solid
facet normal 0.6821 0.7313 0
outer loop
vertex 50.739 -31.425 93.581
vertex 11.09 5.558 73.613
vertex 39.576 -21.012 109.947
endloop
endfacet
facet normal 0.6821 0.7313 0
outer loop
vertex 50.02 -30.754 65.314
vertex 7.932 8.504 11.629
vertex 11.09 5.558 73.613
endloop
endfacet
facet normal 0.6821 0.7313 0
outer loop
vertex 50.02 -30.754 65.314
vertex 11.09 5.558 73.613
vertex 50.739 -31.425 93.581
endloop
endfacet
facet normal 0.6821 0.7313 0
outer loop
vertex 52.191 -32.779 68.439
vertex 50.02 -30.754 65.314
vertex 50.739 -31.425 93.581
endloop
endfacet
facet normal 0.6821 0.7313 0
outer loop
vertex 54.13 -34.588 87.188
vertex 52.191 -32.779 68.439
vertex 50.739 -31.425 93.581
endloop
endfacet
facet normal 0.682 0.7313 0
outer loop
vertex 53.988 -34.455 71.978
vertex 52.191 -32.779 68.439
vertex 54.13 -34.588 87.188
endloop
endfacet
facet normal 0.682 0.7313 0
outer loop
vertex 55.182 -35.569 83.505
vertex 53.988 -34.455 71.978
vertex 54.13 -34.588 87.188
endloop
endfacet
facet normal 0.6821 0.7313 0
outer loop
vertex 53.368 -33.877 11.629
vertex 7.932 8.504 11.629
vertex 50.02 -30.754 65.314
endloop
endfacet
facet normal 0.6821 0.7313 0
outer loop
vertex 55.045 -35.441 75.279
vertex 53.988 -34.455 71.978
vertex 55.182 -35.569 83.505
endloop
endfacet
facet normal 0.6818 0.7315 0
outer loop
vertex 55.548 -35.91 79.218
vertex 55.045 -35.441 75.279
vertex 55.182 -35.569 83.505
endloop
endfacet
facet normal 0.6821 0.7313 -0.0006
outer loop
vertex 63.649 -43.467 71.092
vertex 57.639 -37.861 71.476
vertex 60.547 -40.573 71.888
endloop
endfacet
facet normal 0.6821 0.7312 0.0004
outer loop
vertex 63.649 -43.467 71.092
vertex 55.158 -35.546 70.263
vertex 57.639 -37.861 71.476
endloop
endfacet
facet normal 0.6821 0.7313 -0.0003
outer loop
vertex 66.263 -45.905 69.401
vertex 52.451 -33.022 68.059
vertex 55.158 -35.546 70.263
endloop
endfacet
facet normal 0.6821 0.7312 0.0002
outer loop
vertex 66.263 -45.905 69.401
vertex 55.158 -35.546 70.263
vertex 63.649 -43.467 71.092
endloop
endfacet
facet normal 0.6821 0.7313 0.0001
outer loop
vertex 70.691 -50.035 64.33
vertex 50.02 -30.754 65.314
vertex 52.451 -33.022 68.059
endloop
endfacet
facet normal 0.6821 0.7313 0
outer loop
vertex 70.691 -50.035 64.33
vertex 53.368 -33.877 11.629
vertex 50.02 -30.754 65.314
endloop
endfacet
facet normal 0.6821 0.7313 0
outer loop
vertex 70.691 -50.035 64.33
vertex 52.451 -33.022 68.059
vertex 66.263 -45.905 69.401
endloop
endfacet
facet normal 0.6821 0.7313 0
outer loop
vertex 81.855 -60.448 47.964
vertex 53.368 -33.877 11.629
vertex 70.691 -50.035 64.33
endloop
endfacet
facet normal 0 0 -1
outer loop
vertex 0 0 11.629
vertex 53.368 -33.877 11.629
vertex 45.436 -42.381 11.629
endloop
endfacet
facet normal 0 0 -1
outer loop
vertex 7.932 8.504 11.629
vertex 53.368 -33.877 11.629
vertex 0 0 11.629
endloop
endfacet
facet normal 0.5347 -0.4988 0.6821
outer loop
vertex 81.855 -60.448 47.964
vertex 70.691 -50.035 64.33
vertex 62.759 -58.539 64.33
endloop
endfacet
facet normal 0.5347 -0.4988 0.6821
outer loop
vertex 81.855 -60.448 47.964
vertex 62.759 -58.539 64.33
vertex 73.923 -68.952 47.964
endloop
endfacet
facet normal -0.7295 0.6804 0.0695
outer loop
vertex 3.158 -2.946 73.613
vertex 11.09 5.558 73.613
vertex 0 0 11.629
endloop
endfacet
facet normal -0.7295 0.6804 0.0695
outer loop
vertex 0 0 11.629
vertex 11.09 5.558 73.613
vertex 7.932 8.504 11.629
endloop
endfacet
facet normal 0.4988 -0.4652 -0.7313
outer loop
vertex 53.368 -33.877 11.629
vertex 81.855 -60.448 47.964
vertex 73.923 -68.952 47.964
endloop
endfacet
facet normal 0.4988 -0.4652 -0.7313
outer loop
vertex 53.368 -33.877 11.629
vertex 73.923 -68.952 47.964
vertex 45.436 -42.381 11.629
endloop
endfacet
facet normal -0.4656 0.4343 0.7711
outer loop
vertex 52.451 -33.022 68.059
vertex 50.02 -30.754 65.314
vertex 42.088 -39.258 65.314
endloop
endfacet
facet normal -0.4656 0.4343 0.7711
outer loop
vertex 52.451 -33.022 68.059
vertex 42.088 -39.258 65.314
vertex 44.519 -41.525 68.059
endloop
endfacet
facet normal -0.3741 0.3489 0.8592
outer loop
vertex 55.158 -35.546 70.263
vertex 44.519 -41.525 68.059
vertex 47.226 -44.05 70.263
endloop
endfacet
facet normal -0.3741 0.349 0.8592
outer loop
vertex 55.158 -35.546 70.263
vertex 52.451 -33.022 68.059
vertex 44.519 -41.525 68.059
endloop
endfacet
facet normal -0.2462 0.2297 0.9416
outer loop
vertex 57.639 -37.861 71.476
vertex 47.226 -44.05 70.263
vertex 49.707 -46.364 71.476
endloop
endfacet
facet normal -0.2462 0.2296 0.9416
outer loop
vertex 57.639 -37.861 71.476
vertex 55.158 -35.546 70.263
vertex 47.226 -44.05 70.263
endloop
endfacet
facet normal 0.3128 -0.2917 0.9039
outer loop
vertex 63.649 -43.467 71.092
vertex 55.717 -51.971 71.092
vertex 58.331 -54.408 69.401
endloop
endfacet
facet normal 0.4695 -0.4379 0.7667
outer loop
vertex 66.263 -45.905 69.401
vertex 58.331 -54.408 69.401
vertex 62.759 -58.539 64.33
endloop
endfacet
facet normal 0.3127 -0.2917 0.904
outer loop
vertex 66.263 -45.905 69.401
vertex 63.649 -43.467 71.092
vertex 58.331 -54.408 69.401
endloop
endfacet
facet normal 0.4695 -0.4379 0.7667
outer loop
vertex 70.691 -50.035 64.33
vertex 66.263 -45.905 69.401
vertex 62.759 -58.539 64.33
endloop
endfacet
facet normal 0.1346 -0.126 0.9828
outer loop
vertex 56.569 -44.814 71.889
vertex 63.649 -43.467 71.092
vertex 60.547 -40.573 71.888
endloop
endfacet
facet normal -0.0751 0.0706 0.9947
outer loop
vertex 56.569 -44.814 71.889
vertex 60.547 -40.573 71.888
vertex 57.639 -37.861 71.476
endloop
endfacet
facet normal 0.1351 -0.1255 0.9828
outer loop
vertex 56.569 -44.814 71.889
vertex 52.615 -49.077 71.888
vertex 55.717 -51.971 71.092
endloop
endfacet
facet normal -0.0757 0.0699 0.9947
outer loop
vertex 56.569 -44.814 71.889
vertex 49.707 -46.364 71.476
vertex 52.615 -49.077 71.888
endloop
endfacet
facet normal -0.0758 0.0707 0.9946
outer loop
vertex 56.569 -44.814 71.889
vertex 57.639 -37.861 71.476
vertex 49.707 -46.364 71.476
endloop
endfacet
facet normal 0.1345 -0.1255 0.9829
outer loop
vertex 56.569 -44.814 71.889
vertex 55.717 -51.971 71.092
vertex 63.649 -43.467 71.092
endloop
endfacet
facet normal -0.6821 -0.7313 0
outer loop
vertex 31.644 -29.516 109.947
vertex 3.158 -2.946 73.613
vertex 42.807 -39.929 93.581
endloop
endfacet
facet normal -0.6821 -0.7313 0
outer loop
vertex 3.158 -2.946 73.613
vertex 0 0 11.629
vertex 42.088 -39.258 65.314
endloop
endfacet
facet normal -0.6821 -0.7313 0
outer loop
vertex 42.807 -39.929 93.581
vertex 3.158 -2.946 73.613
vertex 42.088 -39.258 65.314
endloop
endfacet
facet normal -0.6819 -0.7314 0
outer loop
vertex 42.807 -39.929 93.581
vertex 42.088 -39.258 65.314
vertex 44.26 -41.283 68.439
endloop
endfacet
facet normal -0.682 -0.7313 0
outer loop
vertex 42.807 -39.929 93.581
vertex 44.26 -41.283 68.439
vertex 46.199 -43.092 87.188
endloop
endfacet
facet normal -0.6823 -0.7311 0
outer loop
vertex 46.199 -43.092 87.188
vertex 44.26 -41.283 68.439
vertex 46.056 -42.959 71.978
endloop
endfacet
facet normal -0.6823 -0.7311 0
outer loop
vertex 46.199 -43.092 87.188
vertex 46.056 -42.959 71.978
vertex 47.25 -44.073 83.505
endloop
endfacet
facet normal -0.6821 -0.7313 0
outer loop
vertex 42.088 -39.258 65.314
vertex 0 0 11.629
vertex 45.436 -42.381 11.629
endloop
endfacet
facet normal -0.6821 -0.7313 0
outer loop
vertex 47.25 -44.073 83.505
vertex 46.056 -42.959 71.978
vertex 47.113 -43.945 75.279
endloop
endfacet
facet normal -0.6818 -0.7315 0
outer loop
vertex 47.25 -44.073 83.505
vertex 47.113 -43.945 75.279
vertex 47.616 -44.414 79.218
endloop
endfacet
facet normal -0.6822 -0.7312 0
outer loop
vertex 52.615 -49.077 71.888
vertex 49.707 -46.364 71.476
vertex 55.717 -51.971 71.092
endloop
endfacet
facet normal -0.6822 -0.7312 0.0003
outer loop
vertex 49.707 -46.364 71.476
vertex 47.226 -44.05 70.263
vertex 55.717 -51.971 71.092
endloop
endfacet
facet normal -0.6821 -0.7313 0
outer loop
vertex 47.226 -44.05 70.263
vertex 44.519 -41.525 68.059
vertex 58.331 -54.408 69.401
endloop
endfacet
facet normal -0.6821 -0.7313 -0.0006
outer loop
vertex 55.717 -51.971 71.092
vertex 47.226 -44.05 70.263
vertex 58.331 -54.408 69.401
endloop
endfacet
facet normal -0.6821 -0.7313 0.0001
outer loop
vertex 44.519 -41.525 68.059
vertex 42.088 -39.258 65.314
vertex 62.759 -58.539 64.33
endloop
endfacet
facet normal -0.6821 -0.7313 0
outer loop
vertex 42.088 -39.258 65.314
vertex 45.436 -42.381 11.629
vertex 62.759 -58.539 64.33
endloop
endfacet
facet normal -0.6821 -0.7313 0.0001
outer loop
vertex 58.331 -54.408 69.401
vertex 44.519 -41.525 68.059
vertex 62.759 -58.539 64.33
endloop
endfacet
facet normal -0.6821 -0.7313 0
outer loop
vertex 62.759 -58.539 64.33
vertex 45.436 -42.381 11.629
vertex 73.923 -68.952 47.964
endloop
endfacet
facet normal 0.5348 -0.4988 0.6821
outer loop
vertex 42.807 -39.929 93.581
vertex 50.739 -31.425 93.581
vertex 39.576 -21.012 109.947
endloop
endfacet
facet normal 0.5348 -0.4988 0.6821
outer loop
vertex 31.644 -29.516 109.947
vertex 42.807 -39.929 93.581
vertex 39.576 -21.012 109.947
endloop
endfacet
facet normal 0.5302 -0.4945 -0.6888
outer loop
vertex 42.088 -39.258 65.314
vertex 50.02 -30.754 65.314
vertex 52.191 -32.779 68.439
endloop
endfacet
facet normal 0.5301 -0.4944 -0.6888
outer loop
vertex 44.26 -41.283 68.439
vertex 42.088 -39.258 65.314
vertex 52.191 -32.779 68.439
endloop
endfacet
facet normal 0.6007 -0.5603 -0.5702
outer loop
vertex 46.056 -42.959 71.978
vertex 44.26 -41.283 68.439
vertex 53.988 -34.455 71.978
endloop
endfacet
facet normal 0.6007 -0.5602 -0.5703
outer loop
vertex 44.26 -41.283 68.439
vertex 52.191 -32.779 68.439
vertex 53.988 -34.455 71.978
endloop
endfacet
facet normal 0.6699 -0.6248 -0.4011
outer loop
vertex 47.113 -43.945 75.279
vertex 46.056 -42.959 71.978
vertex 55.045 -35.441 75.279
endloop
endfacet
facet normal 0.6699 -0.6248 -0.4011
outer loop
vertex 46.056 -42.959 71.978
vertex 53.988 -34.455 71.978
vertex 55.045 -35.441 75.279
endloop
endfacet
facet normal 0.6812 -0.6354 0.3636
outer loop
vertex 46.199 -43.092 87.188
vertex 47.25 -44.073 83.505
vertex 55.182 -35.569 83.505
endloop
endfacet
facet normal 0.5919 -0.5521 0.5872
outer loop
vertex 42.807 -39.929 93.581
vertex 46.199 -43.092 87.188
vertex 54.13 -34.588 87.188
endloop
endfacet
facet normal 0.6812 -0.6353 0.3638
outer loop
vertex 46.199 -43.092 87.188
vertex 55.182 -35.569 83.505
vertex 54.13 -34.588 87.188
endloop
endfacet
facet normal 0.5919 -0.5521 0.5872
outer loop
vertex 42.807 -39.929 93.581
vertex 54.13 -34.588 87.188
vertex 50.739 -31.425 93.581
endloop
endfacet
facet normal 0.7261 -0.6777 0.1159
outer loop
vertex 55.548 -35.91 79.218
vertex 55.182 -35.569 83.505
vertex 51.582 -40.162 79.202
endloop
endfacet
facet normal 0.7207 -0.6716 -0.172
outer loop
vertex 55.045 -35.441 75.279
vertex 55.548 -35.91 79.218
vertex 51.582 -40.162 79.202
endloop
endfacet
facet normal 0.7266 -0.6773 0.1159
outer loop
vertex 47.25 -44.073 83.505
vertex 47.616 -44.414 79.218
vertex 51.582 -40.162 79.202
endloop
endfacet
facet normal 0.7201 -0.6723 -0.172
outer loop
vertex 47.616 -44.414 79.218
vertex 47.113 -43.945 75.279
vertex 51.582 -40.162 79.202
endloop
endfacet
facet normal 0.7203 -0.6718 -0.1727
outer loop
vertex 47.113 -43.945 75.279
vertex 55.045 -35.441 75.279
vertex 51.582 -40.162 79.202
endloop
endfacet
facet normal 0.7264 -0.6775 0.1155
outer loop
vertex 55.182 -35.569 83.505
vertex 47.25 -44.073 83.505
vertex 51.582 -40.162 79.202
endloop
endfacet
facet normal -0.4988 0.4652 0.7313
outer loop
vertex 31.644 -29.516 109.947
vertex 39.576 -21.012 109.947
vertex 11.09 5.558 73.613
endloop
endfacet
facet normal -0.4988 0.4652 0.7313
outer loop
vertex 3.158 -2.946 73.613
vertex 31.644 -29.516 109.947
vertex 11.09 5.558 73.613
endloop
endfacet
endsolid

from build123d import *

# Parameters (mm, degrees)
F1_DEPTH    = 11.62886
F2_T1_DEPTH = 111.62886
F4_ANGLE    = -90


# Not quite as in the source:
# - a fillet or chamfer that OpenCascade refuses, or shapes differently, is made with other operations: its cross-section is extruded or revolved along the edge and cut away or added


with BuildPart() as f1:
    # F0 (on Top) → F1 (new body)
    with BuildSketch(Plane.XY):
        Polygon((45.4364679754, 42.3810482025), (0, 0), (98.7063497305, 0), (98.7063497305, 42.3810482025), align=None)
    extrude(amount=F1_DEPTH)

    # F2: fillet of radius 20 on 1 edges, made by hand

    # F2_s2 → F2_t1 (cut)
    with BuildSketch(Plane.XY.offset(-50)):
        with BuildLine():
            add(Edge.make_bspline(
                [(78.7063497305, 0), (98.7063497305, 0), (98.7063497305, 20)],
                knots=[0, 0, 0, 1, 1, 1], degree=2, weights=[1, 1, 1]))
            Line((98.7063497305, 20), (98.7063497305, 0))
            Line((98.7063497305, 0), (78.7063497305, 0))
        make_face()
    extrude(amount=F2_T1_DEPTH, mode=Mode.SUBTRACT)

    # F3: F1 across plane


with BuildPart() as f1_1:
    add(f1.part)
    add(f1.part.mirror(Plane.XZ))


with BuildPart() as f1_2:
    # F4: moved
    add(f1_1.part.rotate(Axis((22.7182339877, -21.1905241013, 11.62886), (-0.7312665459, 0.6820918111, 0)), F4_ANGLE))


solid = f1_2.part
